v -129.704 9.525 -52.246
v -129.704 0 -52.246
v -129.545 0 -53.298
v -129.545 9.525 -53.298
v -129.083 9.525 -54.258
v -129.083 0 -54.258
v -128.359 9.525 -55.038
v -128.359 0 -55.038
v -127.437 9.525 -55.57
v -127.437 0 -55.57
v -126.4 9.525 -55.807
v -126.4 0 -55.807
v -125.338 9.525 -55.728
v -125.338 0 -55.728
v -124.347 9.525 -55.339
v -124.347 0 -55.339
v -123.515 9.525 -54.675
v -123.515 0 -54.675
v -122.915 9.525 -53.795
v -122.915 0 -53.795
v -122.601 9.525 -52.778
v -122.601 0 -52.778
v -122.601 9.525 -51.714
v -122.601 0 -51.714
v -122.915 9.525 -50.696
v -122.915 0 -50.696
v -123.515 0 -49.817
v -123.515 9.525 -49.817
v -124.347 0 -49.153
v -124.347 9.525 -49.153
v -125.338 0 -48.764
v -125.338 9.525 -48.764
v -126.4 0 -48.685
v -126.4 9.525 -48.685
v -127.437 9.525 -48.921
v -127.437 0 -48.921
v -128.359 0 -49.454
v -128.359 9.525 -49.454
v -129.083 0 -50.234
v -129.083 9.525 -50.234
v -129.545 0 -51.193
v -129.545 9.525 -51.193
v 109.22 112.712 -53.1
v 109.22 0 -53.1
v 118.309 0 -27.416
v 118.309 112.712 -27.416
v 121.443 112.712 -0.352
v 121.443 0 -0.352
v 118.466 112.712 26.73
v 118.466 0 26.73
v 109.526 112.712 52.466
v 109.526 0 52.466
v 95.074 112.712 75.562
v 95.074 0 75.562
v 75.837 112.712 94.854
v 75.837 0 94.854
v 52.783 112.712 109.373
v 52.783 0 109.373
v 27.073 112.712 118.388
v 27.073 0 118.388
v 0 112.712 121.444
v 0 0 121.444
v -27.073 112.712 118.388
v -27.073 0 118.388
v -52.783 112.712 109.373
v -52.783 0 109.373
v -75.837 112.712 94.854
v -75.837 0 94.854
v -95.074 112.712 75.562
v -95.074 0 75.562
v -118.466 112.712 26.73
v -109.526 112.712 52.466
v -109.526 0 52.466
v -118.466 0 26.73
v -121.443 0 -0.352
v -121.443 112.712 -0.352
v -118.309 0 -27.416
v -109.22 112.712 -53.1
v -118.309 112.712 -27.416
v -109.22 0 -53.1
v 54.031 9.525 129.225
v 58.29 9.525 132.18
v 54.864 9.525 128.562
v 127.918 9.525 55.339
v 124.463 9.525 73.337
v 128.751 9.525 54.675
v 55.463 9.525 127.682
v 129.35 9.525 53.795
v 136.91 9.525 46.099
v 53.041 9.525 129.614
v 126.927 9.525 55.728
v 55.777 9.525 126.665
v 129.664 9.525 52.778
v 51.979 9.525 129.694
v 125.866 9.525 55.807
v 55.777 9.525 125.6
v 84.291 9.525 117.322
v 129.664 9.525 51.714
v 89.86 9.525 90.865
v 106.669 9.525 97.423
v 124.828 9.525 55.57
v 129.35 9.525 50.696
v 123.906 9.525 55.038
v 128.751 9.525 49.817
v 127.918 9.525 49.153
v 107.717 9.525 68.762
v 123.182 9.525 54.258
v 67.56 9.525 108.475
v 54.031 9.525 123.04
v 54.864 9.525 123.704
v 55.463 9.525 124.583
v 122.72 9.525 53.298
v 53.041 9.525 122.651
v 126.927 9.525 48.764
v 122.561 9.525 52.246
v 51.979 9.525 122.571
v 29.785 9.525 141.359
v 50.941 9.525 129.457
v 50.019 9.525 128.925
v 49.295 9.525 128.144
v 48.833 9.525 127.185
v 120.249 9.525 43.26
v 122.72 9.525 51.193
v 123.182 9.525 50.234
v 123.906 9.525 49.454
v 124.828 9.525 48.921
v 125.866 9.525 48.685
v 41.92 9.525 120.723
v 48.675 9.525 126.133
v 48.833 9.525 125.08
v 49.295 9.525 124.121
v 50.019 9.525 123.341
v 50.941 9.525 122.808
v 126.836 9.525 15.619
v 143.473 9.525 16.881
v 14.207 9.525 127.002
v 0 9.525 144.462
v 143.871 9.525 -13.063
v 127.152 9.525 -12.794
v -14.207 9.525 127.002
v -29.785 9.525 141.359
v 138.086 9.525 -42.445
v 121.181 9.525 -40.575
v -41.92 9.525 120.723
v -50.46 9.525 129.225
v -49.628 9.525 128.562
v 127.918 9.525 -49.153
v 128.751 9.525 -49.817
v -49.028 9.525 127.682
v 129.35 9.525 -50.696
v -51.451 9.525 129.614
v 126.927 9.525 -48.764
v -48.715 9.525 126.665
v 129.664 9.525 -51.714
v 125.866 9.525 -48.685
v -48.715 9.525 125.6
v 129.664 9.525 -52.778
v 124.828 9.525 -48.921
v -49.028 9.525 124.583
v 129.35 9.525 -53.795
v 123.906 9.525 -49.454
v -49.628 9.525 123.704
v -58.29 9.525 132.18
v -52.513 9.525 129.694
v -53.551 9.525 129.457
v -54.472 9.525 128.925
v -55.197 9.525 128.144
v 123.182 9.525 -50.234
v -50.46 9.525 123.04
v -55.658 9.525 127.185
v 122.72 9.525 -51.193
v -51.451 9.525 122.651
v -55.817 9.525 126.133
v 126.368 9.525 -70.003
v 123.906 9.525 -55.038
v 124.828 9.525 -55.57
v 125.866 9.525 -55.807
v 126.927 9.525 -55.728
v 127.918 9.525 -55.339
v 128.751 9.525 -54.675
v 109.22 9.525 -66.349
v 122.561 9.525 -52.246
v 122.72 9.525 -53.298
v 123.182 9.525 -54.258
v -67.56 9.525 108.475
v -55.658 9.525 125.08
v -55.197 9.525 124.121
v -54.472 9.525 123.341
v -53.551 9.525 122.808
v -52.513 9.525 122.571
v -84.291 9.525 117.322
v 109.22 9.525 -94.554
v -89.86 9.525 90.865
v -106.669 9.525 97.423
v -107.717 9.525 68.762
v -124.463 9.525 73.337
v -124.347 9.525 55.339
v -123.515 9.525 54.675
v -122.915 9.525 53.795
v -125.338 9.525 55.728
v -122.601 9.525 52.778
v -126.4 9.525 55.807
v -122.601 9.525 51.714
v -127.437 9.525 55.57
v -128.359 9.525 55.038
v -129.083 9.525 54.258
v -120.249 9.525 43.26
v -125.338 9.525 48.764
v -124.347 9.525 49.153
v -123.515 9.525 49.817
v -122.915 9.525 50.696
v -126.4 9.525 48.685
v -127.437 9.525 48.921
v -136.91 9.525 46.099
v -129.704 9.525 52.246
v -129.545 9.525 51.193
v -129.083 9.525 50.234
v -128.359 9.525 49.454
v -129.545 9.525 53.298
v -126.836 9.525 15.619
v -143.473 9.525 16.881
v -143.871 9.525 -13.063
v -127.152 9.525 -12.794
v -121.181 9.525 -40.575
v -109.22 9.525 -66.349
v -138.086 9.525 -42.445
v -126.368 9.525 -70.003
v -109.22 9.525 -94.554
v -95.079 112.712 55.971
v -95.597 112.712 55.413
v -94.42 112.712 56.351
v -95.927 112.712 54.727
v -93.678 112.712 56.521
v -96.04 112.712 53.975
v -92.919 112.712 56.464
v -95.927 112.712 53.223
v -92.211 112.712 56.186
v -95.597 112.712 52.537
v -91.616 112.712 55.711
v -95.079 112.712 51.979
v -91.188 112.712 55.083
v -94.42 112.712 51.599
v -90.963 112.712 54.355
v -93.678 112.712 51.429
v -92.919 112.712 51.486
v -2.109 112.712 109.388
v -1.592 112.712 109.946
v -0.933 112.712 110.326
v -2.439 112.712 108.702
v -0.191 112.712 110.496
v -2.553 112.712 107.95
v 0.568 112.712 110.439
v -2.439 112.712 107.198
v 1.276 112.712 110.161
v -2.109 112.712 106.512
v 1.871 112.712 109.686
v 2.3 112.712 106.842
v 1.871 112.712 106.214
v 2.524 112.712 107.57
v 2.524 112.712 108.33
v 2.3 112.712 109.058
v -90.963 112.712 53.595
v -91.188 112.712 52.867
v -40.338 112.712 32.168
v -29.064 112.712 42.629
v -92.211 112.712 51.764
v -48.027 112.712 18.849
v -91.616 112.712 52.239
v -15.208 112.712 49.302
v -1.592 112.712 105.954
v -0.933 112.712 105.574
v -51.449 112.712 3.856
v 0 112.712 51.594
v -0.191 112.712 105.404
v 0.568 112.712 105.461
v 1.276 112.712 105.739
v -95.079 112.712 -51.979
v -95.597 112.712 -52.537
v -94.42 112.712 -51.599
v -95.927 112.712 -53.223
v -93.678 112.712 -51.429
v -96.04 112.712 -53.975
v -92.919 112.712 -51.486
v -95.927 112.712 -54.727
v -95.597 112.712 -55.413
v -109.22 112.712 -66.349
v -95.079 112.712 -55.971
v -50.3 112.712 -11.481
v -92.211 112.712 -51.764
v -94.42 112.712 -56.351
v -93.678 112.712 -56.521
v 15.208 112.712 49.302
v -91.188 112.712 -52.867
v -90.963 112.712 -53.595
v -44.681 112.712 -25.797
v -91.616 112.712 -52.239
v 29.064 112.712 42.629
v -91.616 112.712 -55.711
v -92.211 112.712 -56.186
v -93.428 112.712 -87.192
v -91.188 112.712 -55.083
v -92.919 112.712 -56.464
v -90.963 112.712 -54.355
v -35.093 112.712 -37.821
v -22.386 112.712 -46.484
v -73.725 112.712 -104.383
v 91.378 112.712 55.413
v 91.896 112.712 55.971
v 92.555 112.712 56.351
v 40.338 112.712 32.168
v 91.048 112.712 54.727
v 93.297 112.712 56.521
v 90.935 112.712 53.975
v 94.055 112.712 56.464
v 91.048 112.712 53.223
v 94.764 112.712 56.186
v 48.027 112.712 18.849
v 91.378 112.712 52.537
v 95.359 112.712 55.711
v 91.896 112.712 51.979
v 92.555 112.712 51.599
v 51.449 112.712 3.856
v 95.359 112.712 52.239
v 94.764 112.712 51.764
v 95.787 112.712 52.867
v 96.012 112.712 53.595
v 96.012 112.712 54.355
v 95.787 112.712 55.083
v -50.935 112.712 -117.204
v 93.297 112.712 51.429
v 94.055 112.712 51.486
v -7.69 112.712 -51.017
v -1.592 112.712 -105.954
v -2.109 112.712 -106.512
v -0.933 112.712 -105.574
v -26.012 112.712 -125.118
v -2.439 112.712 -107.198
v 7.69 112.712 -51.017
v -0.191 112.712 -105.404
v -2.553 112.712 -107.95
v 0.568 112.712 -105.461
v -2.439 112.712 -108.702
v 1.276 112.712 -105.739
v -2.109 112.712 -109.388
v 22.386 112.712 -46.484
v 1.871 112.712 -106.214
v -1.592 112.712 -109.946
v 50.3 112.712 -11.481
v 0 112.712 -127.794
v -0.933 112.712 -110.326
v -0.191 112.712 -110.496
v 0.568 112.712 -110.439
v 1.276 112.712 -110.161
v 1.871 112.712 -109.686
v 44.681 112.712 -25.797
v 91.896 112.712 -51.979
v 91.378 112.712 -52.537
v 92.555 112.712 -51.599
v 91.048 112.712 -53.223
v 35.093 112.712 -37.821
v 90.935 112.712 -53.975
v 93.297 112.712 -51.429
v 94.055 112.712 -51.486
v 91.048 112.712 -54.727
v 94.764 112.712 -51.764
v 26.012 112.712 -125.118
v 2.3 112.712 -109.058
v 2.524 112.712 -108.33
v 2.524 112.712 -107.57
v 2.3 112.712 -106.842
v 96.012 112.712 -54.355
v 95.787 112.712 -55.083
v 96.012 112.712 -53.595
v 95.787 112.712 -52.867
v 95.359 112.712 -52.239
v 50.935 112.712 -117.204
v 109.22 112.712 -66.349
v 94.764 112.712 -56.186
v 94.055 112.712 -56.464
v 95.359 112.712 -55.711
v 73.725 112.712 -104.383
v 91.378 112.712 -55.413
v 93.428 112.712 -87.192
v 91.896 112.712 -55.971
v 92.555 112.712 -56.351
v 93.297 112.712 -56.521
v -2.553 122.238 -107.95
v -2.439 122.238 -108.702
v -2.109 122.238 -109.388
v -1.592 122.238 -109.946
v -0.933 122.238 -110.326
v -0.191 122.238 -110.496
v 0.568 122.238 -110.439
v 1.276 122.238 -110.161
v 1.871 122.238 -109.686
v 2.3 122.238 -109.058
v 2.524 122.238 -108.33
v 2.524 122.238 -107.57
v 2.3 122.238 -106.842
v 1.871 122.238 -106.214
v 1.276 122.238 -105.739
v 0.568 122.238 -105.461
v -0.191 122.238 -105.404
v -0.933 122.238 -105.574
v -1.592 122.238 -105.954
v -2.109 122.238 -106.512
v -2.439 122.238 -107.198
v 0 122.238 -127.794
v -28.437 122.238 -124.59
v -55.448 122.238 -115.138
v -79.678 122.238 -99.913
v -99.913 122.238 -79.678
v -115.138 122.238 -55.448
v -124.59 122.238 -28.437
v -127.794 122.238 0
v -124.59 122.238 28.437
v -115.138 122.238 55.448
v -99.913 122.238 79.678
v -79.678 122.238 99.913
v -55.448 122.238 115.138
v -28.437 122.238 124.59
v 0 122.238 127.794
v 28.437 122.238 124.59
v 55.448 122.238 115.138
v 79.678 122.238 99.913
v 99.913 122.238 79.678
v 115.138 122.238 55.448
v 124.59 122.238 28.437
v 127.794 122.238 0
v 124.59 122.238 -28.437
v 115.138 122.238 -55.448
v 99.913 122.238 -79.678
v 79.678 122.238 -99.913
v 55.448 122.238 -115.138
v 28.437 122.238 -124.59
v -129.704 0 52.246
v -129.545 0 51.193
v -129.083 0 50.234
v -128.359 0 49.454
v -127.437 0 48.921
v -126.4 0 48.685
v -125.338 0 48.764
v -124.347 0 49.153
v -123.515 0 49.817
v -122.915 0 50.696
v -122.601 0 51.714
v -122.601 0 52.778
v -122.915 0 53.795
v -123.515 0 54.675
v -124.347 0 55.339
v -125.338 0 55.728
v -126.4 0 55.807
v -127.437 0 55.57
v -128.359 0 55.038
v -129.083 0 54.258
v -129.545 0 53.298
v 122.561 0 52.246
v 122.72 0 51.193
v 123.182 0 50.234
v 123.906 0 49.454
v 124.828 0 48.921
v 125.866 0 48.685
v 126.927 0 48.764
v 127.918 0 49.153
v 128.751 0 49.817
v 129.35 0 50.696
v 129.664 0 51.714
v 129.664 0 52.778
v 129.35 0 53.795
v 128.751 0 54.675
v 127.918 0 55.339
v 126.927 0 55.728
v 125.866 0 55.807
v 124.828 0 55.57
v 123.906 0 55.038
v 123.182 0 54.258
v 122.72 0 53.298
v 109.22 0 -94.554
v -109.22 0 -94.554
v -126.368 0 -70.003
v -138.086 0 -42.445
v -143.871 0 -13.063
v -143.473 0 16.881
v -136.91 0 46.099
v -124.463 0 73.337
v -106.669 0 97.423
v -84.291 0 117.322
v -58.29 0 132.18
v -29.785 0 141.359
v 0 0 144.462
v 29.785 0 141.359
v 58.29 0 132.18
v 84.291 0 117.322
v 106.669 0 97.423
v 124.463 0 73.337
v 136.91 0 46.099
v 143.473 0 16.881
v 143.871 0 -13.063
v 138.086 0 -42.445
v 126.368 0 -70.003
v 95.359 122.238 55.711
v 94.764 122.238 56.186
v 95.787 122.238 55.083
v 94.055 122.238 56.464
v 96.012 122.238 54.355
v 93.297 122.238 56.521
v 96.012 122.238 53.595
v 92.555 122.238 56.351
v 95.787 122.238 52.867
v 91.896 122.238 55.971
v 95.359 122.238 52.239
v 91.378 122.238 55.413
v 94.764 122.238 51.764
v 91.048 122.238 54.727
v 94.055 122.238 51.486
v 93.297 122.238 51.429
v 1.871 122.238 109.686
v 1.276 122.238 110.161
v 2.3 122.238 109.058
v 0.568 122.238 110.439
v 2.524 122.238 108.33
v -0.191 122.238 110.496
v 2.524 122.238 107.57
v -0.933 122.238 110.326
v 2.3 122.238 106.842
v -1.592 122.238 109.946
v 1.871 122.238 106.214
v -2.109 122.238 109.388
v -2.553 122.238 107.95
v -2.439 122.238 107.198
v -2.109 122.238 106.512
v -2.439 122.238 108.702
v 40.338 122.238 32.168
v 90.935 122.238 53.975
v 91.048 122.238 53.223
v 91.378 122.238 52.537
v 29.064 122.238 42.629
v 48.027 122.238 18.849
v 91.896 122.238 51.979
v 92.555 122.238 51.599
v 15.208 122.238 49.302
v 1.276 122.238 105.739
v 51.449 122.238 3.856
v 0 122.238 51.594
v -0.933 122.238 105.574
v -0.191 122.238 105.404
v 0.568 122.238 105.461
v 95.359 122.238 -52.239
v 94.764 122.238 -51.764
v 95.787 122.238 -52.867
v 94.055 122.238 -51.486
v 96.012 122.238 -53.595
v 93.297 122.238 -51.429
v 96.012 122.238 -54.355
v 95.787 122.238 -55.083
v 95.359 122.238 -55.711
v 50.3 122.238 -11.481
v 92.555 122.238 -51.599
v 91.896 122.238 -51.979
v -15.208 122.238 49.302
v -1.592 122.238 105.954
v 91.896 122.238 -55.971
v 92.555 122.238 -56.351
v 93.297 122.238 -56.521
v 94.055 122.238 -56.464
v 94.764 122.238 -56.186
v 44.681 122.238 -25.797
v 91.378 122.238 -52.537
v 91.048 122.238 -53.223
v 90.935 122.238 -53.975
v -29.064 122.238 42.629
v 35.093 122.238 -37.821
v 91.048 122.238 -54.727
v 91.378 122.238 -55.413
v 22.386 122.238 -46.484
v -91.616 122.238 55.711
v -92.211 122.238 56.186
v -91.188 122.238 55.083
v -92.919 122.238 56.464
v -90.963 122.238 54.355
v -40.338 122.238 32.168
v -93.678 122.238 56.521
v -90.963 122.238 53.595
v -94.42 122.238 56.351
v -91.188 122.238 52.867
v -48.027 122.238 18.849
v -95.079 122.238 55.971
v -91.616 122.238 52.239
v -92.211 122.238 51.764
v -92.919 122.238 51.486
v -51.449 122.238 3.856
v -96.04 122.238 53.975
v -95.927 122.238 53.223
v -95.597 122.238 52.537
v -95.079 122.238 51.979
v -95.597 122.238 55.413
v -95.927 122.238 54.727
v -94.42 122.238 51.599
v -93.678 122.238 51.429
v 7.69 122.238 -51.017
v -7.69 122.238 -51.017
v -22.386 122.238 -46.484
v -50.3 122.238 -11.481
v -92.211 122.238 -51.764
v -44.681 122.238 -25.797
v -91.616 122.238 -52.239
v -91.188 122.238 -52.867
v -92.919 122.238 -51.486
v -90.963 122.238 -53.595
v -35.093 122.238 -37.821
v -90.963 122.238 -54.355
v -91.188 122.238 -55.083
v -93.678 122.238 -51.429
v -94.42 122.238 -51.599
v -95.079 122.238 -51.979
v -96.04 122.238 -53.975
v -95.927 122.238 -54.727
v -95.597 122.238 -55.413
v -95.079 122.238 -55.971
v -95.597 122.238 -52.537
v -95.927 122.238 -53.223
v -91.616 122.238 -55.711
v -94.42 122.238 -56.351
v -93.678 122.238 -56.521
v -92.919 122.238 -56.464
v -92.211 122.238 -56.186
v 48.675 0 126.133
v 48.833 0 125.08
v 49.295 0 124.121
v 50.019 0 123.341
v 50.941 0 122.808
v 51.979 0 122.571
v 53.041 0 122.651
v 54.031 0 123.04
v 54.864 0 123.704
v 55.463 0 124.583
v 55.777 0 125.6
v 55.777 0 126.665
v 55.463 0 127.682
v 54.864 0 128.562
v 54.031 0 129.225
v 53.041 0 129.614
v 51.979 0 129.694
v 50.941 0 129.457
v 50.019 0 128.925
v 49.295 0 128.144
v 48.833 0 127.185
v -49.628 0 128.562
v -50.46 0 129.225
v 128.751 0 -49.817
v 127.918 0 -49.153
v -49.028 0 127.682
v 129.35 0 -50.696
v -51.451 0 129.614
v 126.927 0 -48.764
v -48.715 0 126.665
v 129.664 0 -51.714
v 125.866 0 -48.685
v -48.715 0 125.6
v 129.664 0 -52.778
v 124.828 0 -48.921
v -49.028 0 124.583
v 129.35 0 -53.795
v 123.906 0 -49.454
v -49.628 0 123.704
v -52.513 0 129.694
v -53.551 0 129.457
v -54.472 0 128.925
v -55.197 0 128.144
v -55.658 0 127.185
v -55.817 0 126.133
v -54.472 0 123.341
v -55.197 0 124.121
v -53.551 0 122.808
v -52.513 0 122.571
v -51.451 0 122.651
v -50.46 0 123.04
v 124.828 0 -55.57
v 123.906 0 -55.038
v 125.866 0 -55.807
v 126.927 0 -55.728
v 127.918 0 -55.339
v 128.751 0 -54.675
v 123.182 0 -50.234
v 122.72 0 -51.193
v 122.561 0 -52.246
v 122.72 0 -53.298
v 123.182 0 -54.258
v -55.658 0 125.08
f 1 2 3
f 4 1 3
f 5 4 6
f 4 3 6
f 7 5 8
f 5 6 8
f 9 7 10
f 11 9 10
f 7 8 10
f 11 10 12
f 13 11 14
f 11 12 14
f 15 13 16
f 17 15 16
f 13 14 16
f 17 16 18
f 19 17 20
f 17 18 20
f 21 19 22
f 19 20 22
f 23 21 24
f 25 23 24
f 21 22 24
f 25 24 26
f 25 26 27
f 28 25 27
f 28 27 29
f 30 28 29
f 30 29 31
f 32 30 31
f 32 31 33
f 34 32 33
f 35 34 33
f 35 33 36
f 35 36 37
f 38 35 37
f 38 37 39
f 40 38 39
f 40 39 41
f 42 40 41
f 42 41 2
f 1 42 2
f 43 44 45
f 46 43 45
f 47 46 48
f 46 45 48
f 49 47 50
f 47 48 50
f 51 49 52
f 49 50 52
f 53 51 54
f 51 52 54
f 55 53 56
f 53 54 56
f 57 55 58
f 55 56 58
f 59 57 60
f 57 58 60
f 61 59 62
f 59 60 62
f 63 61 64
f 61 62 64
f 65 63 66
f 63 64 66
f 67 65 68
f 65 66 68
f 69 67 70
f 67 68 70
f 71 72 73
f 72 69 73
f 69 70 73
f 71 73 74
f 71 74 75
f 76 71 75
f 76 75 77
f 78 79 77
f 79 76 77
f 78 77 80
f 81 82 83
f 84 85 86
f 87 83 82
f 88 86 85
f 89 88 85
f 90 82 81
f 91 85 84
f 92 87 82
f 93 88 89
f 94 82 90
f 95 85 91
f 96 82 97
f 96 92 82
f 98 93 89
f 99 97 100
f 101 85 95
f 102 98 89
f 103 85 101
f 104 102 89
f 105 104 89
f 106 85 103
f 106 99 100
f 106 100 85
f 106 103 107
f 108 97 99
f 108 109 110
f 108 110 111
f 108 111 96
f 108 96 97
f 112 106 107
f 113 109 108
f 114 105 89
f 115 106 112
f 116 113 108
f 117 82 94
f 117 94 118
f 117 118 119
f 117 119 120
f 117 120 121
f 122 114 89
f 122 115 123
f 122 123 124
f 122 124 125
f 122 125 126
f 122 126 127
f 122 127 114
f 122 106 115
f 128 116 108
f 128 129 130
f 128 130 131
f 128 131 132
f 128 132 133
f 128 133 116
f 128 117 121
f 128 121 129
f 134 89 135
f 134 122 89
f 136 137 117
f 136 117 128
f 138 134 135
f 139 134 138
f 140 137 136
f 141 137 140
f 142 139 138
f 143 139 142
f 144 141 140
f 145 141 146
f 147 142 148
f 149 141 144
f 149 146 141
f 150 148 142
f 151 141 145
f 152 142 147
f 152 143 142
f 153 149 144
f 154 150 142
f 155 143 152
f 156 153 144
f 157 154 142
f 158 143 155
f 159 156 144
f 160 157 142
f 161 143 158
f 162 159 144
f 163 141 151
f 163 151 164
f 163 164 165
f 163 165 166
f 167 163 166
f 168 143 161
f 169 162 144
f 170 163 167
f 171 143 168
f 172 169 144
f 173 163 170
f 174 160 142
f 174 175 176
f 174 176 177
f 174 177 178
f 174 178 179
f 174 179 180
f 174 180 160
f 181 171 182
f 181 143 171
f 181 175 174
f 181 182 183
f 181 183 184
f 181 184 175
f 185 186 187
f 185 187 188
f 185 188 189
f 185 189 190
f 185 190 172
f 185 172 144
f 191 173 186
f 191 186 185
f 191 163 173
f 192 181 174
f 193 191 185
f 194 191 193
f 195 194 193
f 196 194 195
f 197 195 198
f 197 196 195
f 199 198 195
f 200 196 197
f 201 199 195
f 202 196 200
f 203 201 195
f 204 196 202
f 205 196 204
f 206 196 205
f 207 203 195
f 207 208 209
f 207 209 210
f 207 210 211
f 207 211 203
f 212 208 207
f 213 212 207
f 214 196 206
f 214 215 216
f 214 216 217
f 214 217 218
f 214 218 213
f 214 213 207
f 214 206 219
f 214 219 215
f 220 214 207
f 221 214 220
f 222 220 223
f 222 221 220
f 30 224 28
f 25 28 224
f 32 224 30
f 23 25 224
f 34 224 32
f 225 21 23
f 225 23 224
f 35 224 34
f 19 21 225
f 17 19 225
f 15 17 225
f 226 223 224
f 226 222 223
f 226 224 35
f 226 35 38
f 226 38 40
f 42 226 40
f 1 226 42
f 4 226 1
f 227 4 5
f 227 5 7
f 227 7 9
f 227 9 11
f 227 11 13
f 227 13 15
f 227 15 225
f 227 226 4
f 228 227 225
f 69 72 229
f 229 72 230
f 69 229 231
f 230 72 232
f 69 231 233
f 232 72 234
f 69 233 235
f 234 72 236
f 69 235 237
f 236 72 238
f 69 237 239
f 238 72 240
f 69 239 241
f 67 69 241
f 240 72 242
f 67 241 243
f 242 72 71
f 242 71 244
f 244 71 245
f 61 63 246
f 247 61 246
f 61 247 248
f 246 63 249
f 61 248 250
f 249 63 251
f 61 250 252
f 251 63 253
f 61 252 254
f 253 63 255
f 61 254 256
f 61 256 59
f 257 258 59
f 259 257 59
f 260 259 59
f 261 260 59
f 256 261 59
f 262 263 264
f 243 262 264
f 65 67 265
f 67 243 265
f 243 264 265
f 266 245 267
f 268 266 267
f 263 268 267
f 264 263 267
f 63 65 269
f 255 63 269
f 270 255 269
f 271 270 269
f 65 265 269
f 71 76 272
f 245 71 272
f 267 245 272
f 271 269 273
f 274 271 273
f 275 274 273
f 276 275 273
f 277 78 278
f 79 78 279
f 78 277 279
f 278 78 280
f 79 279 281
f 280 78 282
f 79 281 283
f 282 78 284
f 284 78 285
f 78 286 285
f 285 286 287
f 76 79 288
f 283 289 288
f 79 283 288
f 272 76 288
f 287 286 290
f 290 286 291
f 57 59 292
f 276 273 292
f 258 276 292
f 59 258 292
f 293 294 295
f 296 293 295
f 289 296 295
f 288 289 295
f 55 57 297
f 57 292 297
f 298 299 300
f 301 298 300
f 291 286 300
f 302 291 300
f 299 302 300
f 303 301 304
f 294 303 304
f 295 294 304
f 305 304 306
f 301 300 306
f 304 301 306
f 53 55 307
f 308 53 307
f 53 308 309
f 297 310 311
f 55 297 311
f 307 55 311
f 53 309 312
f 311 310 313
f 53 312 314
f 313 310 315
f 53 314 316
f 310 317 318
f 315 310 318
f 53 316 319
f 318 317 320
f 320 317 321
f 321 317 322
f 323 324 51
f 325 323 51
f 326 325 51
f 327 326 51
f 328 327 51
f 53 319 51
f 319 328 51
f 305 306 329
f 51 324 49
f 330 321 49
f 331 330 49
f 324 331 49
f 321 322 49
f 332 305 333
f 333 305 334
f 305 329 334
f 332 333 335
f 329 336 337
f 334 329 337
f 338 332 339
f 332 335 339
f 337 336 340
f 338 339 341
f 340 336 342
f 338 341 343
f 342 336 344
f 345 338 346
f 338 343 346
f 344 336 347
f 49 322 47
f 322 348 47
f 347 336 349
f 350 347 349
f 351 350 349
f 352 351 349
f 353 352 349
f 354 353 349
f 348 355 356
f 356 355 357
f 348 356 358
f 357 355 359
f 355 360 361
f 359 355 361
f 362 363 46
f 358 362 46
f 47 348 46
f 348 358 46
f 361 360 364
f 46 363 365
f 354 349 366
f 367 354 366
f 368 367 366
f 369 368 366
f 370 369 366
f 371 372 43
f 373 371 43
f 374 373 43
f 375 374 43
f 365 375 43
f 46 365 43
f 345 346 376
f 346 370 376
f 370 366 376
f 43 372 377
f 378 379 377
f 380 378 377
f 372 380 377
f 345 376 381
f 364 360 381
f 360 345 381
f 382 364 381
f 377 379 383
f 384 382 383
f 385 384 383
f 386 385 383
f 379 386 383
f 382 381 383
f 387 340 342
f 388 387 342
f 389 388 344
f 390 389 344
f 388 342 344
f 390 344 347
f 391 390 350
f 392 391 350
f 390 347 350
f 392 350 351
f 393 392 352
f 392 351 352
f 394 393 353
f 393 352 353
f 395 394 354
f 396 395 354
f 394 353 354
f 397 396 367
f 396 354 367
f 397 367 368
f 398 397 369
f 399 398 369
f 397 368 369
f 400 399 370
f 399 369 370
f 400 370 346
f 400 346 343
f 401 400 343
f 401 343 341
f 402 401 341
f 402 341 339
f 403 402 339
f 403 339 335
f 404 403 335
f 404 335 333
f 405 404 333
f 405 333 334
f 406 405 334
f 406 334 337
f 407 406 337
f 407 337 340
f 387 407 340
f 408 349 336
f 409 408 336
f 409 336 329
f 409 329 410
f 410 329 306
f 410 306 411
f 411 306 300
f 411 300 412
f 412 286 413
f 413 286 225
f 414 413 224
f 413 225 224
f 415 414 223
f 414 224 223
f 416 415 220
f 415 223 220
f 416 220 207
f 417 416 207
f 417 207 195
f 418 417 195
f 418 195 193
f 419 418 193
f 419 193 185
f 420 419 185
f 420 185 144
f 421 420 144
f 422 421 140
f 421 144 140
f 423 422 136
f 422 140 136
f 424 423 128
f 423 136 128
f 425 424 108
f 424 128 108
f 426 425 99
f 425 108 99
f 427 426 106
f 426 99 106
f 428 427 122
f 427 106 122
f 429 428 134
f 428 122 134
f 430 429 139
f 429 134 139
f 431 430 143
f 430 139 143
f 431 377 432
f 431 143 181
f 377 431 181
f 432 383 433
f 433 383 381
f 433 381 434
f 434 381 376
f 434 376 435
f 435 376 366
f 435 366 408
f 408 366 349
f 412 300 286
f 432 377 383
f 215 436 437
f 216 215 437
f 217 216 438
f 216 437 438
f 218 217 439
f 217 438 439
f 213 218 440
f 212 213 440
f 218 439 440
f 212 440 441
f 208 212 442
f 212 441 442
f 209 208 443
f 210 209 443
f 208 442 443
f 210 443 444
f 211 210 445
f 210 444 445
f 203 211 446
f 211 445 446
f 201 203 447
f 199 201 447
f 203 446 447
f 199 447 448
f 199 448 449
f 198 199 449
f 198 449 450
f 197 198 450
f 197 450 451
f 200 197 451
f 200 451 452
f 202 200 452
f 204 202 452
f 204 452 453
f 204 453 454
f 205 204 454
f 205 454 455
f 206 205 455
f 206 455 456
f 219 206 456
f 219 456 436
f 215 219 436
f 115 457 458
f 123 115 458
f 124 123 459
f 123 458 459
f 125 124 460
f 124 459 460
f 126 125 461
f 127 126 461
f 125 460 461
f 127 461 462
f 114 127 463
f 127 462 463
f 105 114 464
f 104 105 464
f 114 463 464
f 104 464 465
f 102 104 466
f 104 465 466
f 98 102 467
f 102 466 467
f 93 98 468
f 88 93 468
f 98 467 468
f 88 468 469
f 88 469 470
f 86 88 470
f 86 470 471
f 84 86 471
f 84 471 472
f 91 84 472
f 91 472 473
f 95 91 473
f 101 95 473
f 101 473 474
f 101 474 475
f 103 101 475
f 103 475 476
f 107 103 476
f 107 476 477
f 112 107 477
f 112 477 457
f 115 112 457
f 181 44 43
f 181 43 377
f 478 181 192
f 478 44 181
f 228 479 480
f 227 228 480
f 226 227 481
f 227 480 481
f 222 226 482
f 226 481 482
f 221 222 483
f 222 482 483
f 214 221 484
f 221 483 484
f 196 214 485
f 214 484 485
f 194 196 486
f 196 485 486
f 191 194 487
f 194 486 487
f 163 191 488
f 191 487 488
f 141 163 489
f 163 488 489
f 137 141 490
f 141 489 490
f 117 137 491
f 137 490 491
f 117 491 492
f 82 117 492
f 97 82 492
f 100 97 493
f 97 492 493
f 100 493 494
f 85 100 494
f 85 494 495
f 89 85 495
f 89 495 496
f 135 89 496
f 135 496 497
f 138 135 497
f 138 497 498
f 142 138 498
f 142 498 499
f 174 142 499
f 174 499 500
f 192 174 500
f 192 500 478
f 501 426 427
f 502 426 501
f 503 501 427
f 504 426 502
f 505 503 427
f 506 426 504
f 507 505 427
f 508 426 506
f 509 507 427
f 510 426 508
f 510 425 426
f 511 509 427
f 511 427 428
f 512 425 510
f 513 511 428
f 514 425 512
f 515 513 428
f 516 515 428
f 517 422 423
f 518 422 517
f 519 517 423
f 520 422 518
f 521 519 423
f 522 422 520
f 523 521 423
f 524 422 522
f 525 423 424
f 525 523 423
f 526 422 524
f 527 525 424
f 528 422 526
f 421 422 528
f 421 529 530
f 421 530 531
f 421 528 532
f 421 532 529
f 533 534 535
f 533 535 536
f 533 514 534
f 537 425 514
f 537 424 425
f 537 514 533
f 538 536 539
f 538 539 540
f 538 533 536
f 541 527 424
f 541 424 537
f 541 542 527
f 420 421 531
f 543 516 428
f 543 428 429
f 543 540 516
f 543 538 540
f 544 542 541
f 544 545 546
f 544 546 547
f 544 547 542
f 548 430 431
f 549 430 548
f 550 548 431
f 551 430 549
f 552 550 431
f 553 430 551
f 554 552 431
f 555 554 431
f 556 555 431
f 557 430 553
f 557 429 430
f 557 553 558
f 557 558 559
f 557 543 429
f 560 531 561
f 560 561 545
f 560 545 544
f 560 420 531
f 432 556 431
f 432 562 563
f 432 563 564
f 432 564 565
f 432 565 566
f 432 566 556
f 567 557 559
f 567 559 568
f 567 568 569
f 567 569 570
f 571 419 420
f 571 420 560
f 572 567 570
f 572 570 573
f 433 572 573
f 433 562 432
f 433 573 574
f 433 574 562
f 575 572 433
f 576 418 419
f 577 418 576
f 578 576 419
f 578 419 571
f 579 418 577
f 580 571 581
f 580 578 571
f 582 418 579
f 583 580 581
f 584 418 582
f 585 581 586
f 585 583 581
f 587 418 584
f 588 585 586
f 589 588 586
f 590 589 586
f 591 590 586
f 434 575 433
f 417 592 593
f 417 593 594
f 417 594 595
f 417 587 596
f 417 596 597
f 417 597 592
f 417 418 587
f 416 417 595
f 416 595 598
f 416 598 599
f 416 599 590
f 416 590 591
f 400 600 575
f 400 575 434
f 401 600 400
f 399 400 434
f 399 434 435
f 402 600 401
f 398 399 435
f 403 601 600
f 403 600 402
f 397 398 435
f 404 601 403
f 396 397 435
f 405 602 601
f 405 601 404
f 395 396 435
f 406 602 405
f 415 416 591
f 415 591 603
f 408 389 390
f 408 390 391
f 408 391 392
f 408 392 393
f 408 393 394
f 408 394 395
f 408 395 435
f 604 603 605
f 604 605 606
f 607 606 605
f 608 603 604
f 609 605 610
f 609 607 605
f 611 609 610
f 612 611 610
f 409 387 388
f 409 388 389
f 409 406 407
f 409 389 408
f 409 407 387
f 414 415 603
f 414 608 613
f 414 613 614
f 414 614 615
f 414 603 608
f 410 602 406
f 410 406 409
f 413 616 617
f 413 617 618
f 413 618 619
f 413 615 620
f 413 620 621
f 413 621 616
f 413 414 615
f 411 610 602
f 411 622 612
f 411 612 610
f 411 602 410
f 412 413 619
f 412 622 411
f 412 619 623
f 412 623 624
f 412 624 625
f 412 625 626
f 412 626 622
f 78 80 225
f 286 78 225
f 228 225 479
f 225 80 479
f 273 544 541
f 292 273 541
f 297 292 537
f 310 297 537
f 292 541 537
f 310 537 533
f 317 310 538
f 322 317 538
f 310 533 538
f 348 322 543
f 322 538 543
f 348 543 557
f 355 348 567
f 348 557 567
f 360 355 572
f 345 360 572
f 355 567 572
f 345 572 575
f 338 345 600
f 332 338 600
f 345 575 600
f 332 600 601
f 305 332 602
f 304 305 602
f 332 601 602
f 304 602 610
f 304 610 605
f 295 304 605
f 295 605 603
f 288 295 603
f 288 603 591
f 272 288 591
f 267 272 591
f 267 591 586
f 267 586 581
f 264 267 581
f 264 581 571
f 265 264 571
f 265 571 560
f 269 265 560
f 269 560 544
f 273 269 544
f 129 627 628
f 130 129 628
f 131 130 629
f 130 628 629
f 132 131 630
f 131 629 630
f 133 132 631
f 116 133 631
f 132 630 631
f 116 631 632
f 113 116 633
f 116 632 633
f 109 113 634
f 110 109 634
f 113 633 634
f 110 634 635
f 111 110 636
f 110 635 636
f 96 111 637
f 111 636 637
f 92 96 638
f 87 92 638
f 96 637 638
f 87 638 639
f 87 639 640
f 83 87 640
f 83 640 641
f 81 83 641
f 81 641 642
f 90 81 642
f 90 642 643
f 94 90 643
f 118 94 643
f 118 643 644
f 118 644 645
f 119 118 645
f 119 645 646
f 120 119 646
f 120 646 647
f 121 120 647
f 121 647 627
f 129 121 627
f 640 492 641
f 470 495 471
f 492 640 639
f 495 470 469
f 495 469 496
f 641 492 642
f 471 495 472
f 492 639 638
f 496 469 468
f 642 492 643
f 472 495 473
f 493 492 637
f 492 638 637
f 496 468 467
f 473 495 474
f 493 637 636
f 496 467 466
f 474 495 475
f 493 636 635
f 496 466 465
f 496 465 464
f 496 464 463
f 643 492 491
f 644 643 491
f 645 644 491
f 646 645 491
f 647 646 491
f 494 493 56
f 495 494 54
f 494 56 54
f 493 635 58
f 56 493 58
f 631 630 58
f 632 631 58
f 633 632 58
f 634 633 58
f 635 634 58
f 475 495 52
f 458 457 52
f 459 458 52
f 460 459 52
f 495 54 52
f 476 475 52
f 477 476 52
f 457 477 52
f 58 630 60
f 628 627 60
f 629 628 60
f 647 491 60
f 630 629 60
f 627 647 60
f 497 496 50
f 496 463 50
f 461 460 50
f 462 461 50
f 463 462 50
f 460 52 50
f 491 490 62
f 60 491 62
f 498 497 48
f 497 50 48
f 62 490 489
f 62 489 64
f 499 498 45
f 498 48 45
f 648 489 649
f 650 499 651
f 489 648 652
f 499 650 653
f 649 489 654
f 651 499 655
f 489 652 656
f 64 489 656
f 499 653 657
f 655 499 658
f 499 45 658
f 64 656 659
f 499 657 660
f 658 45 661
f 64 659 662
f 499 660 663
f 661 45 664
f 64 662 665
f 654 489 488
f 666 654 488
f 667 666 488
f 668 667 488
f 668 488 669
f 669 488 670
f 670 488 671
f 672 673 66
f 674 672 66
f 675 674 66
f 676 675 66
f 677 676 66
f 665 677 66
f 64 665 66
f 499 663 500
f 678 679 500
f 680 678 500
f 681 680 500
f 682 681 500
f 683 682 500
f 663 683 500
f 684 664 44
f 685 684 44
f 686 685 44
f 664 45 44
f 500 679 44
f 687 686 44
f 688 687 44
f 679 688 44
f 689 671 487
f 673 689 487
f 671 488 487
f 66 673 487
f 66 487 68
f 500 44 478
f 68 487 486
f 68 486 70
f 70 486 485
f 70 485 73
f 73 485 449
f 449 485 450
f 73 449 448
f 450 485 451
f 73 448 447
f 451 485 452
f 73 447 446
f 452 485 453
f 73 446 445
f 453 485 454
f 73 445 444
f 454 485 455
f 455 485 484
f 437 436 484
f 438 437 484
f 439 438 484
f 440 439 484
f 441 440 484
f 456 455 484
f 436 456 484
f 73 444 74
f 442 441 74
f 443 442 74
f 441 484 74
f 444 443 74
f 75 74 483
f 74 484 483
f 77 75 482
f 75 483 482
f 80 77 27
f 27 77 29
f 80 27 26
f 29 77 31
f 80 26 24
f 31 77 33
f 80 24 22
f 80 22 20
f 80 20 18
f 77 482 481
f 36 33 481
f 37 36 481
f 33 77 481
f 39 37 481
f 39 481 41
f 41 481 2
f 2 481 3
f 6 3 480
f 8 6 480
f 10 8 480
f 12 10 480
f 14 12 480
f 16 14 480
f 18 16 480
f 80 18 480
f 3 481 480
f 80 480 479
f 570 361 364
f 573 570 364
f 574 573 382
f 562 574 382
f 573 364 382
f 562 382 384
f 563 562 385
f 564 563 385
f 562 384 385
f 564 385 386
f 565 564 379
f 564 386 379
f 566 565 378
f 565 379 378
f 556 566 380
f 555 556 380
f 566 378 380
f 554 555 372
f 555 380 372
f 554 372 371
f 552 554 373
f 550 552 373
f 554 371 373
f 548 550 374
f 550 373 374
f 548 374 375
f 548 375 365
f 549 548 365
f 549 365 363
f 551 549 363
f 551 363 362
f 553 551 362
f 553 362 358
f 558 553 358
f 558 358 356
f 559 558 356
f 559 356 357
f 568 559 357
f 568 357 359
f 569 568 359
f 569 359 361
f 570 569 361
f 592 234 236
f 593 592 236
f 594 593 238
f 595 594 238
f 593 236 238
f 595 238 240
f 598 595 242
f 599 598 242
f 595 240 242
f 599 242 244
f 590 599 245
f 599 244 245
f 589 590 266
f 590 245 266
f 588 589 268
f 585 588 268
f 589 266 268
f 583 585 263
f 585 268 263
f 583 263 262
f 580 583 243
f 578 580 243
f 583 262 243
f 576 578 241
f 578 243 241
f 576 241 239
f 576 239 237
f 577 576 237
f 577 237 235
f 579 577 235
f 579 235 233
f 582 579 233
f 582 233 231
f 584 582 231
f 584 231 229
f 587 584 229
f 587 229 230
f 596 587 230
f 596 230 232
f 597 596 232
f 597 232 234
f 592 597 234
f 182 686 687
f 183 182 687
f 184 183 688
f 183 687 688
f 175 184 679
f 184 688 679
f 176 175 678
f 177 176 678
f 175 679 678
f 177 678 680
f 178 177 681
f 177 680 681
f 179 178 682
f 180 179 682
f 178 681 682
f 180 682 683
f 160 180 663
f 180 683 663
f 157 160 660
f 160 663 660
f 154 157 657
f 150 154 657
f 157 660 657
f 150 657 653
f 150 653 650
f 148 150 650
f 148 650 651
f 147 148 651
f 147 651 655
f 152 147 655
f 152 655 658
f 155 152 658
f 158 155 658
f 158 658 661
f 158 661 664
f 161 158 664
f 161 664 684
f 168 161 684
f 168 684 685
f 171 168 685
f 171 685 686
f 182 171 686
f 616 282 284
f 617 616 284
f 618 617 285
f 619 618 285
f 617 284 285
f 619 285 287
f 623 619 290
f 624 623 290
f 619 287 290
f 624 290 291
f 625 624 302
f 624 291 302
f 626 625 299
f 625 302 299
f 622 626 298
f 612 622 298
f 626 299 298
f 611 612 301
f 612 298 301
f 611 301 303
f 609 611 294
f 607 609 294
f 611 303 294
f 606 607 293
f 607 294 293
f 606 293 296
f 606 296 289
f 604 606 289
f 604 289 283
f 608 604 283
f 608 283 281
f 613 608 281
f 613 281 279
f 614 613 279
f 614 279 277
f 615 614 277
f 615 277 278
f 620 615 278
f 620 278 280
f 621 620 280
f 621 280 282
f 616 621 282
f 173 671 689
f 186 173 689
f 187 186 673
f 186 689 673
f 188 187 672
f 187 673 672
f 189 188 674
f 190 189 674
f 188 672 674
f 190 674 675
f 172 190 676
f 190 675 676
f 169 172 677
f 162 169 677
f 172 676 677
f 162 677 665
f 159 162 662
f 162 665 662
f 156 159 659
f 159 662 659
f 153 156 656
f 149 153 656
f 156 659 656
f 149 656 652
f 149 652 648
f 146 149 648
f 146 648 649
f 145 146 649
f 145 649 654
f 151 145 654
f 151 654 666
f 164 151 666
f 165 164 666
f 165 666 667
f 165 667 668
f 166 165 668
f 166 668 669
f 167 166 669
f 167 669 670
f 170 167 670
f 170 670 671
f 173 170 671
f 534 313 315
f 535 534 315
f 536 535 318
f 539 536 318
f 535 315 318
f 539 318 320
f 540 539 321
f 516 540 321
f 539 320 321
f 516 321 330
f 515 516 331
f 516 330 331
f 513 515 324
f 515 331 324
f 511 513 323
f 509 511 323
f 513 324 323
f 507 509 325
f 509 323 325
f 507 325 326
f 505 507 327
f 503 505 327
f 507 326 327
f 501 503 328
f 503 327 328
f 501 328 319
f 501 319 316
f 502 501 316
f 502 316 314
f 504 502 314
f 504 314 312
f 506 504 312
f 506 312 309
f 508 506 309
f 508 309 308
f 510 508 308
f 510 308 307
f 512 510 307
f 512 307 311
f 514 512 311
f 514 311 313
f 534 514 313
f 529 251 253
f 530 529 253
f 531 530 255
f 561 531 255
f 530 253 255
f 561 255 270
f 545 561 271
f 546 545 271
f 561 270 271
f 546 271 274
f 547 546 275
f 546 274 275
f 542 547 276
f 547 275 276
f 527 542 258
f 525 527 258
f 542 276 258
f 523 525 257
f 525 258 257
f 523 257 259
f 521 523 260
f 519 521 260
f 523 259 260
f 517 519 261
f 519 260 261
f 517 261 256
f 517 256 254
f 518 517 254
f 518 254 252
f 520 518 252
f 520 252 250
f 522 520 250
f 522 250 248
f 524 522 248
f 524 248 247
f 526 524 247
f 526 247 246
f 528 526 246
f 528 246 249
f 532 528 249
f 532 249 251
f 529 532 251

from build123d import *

# Parameters (mm, degrees)
SKETCH1_R                   = 144.4625
BOSS_EXTRUDE1_DEPTH         = 9.525
F_1_4_CLEARANCE_HOLE1_D     = 7.14248
SKETCH4_R                   = 127.79375
SKETCH4_R_2                 = 121.44375
BOSS_EXTRUDE2_DEPTH         = 112.7125
BOSS_EXTRUDE3_START         = -9.525
SKETCH5_R                   = 121.44375
BOSS_EXTRUDE3_DEPTH         = 9.525
CUT_EXTRUDE1_REACH          = 240.077
SKETCH6_R                   = 121.44375
CUT_EXTRUDE2_REACH          = 240.077
SKETCH7_R                   = 51.59375
SKETCH10_W                  = 218.44
SKETCH10_H                  = 91.362820019
CUT_EXTRUDE3_DEPTH          = 112.7125
TAP_DRILL_FOR_1_4_20_TAP1_D = 5.1054


with BuildPart() as part:
    # Sketch1 → Boss-Extrude1 (new body)
    with BuildSketch(Plane(origin=(0, 0, 0), x_dir=(1, 0, 0), z_dir=(0, 1, 0))):
        with Locations(Location((0, 0, 0), (0, 0, 90))):
            Circle(SKETCH1_R)
    extrude(amount=BOSS_EXTRUDE1_DEPTH)

    # 1/4 Clearance Hole1 (through all)
    with Locations(Plane(origin=(0, 9.525, 0), x_dir=(1, 0, 0), z_dir=(0, 1, 0))):
        with Locations((0, 136.525), (-52.245855604, 126.132653176), (52.245855604, 126.132653176), (126.132653176, 52.245855604), (126.132653176, -52.245855604), (52.245855604, -126.132653176), (-52.245855604, -126.132653176), (-126.132653176, -52.245855604), (-126.132653176, 52.245855604)):
            Hole(F_1_4_CLEARANCE_HOLE1_D / 2)

    # Sketch4 → Boss-Extrude2 (add)
    with BuildSketch(Plane(origin=(0, 9.525, 0), x_dir=(1, 0, 0), z_dir=(0, 1, 0))):
        with Locations(Location((0, 0, 0), (0, 0, 90))):
            Circle(SKETCH4_R)
        with Locations(Location((0, 0, 0), (0, 0, 90))):
            Circle(SKETCH4_R_2, mode=Mode.SUBTRACT)
    extrude(amount=BOSS_EXTRUDE2_DEPTH)

    # Sketch5 → Boss-Extrude3 (add)
    with BuildSketch(Plane(origin=(0, 122.2375, 0), x_dir=(1, 0, 0), z_dir=(0, 1, 0)).offset(BOSS_EXTRUDE3_START)):
        with Locations(Location((0, 0, 0), (0, 0, 90))):
            Circle(SKETCH5_R)
    extrude(amount=BOSS_EXTRUDE3_DEPTH)

    # Sketch6 → Cut-Extrude1 (cut, up to next)
    with BuildSketch(Plane.XZ, mode=Mode.PRIVATE) as cut_extrude1_sk1:
        with Locations(Location((0, 0, 0), (0, 0, 270))):
            Circle(SKETCH6_R)
    cut_extrude1_tool1 = extrude(cut_extrude1_sk1.sketch, amount=-CUT_EXTRUDE1_REACH, mode=Mode.PRIVATE) & part.part
    add(cut_extrude1_tool1.solids().sort_by_distance((0, 0, 0))[0], mode=Mode.SUBTRACT)

    # Sketch7 → Cut-Extrude2 (cut, up to next)
    with BuildSketch(Plane(origin=(0, 122.2375, 0), x_dir=(1, 0, 0), z_dir=(0, 1, 0)), mode=Mode.PRIVATE) as cut_extrude2_sk1:
        with Locations(Location((0, 0, 0), (0, 0, 270))):
            Circle(SKETCH7_R)
    cut_extrude2_tool1 = extrude(cut_extrude2_sk1.sketch, amount=-CUT_EXTRUDE2_REACH, mode=Mode.PRIVATE) & part.part
    add(cut_extrude2_tool1.solids().sort_by_distance((0, 122.2375, 0))[0], mode=Mode.SUBTRACT)

    # Sketch10 → Cut-Extrude3 (cut)
    with BuildSketch(Plane(origin=(0, 0, 0), x_dir=(1, 0, 0), z_dir=(0, 1, 0))):
        with Locations((0, 98.781089991)):
            Rectangle(SKETCH10_W, SKETCH10_H)
    extrude(amount=CUT_EXTRUDE3_DEPTH, mode=Mode.SUBTRACT)

    # Tap Drill for 1/4-20 Tap1 (through all)
    with Locations(Plane(origin=(0, 122.2375, 0), x_dir=(1, 0, 0), z_dir=(0, 1, 0))):
        with Locations((93.487442339, -53.975), (0, -107.95), (-93.487442339, -53.975), (-93.487442339, 53.975), (0, 107.95), (93.487442339, 53.975)):
            Hole(TAP_DRILL_FOR_1_4_20_TAP1_D / 2)


solid = part.part
